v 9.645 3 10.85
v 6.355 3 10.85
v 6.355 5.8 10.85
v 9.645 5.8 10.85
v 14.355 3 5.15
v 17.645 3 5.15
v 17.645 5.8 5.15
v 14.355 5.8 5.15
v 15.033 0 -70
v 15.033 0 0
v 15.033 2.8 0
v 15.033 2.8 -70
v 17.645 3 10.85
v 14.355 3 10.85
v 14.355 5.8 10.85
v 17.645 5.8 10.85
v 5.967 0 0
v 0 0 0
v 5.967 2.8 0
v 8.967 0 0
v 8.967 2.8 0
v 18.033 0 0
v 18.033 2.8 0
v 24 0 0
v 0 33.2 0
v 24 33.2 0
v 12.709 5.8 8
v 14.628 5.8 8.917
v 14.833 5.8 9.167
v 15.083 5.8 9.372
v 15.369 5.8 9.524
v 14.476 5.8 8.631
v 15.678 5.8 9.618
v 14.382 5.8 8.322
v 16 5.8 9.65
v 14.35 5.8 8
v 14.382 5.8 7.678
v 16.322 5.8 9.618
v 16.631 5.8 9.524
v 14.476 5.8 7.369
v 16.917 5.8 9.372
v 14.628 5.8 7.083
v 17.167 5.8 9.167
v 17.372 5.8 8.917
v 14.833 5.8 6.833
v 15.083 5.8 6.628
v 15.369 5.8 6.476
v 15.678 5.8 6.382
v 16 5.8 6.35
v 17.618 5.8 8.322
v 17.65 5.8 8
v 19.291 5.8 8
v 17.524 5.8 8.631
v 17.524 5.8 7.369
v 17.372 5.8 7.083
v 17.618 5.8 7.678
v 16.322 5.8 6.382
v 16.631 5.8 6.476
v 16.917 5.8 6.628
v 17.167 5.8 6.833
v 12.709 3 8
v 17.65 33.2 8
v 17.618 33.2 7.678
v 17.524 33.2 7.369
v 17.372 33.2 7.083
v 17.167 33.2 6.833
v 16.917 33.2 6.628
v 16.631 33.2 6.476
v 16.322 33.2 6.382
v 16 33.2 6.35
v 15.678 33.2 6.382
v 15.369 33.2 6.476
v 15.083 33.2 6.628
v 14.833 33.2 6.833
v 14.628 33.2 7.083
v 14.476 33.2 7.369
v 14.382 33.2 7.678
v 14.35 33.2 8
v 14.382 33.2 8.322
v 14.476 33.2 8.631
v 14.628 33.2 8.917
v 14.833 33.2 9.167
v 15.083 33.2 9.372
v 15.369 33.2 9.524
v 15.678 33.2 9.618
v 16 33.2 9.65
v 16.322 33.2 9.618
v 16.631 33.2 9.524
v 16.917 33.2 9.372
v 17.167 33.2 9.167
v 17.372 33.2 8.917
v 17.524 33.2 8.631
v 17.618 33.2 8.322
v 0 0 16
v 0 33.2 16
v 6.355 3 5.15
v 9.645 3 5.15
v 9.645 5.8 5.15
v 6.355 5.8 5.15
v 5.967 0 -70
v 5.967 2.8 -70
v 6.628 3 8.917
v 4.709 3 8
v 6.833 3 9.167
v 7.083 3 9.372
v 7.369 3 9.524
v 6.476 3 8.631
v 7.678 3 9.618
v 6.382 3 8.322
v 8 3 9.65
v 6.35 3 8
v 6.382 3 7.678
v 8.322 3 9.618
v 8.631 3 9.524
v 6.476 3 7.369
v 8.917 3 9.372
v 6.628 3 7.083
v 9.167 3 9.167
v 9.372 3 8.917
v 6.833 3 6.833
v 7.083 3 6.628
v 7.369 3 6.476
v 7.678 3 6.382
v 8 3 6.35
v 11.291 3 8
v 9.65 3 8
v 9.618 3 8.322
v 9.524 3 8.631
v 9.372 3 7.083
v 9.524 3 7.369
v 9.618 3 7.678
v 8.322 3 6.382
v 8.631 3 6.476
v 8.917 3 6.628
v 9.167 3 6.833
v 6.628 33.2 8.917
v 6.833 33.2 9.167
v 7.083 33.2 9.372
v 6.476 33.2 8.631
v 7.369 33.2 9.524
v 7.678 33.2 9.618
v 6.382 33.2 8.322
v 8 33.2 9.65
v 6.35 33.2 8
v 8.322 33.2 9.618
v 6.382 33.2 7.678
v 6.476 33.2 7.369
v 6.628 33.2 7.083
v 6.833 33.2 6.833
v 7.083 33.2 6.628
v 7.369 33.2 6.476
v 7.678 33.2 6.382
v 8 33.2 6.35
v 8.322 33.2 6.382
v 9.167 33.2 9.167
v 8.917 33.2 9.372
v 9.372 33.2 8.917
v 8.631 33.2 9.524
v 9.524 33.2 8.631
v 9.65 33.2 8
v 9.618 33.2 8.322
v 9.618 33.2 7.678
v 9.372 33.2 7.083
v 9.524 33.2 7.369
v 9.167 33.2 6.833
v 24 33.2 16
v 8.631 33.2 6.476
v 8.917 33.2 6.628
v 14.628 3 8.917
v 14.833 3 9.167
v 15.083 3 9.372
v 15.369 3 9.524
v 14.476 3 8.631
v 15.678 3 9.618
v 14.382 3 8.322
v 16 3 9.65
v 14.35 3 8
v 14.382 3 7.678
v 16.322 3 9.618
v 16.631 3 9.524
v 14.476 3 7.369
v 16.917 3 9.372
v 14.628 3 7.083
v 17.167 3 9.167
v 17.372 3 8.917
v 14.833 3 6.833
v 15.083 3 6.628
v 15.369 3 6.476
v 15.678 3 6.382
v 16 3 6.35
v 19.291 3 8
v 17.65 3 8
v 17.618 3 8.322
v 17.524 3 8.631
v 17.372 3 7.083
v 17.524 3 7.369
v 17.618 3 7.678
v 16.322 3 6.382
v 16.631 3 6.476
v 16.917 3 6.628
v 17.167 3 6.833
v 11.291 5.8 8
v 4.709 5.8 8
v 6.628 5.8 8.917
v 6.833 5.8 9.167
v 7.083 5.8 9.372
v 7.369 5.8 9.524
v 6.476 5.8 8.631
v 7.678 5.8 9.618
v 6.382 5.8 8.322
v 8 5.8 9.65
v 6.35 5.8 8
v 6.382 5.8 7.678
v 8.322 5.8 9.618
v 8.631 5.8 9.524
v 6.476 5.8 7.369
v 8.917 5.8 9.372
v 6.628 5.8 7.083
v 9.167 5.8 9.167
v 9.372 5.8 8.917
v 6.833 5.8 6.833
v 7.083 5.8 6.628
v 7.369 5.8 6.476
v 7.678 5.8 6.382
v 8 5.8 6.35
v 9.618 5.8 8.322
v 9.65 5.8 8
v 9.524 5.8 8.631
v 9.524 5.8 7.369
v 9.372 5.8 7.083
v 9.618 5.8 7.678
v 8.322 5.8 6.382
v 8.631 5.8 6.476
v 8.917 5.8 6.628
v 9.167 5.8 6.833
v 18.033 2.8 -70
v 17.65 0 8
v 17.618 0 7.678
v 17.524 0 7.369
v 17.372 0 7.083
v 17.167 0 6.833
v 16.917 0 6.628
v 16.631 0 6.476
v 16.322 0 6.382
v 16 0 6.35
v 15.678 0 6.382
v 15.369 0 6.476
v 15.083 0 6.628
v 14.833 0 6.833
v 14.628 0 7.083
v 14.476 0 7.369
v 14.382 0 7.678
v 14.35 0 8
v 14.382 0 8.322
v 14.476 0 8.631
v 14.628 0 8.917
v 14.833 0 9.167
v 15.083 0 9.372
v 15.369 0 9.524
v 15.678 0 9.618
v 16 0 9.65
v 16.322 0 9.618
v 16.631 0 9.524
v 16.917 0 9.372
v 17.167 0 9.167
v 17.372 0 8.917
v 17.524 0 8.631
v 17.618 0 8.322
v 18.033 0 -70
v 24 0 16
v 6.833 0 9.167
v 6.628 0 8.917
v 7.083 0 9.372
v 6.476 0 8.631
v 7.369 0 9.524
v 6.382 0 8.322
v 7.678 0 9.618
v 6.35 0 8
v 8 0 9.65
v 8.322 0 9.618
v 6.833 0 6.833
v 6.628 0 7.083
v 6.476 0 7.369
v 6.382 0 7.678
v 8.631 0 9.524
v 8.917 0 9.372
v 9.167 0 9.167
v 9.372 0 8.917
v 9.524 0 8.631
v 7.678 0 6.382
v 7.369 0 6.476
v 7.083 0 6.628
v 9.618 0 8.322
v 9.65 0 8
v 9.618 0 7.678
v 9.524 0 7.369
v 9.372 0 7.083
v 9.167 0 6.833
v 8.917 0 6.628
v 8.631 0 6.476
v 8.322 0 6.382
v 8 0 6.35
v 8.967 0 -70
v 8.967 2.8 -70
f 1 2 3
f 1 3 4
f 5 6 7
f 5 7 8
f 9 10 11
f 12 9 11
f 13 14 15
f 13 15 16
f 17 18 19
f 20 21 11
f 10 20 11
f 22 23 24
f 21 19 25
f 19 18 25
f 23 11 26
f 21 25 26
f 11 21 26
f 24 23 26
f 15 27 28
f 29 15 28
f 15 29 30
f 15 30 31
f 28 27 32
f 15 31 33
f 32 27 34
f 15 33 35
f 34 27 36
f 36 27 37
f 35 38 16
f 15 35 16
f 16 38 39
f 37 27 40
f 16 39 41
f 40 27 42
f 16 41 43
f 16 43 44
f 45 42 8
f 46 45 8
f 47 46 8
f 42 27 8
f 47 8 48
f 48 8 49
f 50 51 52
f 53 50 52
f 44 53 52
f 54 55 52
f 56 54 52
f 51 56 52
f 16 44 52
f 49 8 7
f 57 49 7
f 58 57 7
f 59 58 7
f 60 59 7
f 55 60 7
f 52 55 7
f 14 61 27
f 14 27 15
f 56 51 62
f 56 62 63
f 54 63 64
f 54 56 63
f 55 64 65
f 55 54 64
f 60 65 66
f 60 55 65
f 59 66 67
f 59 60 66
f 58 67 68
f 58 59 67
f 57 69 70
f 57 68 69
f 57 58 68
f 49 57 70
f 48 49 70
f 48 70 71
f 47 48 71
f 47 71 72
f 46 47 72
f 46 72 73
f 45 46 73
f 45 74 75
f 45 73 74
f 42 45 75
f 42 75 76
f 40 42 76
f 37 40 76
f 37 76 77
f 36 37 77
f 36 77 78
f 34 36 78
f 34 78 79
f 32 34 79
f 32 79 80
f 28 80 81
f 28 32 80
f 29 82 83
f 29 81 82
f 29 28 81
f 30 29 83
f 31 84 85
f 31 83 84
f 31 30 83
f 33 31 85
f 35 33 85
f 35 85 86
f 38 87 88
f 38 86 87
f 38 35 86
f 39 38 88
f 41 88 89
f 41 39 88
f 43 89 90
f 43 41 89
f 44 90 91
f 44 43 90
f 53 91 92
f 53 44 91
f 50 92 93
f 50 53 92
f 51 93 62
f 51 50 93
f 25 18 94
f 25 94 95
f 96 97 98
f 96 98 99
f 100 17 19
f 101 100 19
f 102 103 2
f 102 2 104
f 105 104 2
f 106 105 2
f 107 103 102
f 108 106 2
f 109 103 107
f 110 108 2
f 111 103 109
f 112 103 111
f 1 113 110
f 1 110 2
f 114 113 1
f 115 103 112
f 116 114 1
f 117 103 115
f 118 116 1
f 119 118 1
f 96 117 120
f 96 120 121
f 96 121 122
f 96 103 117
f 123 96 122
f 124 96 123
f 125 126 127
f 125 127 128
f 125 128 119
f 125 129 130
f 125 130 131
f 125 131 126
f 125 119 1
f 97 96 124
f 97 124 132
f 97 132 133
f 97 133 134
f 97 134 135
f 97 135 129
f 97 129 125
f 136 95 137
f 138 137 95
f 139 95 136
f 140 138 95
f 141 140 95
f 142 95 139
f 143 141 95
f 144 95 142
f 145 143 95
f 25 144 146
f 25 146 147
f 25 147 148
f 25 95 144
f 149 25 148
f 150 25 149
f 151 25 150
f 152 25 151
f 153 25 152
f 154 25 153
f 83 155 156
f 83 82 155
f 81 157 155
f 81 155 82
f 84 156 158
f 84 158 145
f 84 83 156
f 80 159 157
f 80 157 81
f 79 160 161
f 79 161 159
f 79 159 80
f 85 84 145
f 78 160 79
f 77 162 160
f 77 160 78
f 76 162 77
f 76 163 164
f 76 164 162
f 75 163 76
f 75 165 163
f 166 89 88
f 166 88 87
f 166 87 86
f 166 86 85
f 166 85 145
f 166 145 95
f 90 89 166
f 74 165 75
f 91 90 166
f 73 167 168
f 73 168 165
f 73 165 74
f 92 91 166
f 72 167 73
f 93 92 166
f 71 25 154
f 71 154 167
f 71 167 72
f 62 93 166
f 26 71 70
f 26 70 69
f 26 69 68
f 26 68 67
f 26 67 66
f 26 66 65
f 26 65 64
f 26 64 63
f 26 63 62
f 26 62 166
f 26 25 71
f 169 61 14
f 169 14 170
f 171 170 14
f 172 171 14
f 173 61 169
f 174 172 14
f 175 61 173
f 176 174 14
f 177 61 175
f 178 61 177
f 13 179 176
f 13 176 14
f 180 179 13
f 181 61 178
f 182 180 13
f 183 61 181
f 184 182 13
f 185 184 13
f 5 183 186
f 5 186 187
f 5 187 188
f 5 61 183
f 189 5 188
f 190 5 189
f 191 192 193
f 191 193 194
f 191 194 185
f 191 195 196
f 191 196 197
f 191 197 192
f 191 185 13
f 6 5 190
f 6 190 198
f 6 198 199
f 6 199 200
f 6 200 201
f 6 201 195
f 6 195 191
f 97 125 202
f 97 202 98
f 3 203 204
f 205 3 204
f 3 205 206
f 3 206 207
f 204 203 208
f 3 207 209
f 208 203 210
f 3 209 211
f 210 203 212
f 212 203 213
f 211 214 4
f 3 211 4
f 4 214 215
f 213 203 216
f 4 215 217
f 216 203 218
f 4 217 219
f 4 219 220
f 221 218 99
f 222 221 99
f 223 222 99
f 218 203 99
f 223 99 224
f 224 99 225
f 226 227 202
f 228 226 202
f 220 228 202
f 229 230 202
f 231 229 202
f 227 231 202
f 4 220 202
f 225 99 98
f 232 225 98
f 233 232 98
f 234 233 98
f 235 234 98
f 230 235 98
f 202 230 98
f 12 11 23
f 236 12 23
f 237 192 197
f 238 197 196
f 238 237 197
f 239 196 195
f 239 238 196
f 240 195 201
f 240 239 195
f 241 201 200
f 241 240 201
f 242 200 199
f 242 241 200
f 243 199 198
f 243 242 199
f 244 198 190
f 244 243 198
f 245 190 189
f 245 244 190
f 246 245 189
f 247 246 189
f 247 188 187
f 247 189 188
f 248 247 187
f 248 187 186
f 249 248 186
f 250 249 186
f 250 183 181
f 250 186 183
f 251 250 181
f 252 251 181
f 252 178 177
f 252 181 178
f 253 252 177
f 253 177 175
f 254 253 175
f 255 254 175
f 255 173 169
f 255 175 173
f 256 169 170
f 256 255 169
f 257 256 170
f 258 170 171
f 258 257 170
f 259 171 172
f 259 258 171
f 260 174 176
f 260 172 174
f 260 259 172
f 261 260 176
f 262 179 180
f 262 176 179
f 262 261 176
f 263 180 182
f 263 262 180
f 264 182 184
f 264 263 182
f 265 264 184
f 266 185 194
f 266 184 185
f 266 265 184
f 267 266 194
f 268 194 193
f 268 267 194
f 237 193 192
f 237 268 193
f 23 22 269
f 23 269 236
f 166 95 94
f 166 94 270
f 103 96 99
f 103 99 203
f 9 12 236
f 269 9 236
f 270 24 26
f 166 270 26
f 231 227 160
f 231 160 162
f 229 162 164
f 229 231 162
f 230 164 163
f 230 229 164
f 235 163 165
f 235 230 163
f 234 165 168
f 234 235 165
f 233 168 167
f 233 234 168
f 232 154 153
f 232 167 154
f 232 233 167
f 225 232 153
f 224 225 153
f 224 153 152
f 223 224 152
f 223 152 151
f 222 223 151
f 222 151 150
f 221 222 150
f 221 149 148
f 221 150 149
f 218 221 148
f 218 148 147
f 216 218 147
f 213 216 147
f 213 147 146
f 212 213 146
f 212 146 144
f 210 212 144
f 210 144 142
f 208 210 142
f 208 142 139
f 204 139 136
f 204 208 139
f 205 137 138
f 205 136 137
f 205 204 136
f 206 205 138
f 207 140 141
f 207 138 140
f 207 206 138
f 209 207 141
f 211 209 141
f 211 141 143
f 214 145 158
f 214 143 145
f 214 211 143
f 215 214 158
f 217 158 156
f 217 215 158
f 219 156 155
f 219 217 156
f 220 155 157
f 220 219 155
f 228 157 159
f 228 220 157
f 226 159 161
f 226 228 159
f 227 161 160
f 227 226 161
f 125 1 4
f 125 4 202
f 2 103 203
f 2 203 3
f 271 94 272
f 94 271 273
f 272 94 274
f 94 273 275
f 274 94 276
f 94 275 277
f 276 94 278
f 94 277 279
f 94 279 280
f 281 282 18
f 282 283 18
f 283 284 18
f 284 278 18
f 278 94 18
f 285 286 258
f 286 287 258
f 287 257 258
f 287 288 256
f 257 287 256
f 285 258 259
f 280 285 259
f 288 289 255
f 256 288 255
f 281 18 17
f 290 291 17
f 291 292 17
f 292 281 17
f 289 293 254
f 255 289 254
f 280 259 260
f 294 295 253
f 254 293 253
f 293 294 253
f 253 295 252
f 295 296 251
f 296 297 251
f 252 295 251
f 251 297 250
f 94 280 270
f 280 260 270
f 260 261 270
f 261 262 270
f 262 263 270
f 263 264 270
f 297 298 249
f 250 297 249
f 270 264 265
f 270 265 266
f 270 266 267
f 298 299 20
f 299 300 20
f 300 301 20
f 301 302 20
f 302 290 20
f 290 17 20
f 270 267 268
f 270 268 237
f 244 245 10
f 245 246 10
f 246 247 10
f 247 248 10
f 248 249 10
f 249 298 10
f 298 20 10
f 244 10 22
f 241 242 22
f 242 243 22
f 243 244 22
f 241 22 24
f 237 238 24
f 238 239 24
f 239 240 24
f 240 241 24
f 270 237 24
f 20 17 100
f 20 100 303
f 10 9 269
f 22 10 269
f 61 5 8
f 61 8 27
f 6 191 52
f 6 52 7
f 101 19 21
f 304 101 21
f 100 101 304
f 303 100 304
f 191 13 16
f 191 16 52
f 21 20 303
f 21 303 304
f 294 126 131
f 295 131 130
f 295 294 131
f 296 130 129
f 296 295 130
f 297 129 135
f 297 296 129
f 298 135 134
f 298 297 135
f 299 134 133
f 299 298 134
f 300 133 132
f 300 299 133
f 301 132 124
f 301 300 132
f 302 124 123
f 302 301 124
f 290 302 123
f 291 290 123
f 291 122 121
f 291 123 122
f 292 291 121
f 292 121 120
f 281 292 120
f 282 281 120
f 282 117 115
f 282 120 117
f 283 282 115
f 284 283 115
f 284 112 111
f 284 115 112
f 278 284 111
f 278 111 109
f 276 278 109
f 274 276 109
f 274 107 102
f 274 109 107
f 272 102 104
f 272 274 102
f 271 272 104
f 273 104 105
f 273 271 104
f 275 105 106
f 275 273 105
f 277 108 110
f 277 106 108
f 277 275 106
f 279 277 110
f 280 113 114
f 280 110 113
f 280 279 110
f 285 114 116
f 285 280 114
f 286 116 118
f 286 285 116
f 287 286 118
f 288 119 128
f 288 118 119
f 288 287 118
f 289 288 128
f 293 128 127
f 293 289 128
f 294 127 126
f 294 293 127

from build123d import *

# Parameters (mm, degrees)
SKETCH2_W             = 3
SKETCH2_H             = 2.8
BOSS_EXTRUDE1_DEPTH   = 70
BOSS_EXTRUDE1_2_DEPTH = 70
SKETCH3_W             = 24
SKETCH3_H             = 33.2
BOSS_EXTRUDE2_DEPTH   = 16
SKETCH4_R             = 1.65
CUT_EXTRUDE1_DEPTH    = 34.2
CUT_EXTRUDE2_START    = 3
CUT_EXTRUDE2_DEPTH    = 2.8


with BuildPart() as part:
    # Sketch2 → Boss-Extrude1 (new body)
    with BuildSketch(Plane.XY):
        with Locations((7.466666667, 1.4)):
            Rectangle(SKETCH2_W, SKETCH2_H)
    extrude(amount=-BOSS_EXTRUDE1_DEPTH)



with BuildPart() as body_2:
    # Sketch2 → Boss-Extrude1 2 (new body)
    with BuildSketch(Plane.XY):
        with Locations((16.533333333, 1.4)):
            Rectangle(SKETCH2_W, SKETCH2_H)
    extrude(amount=-BOSS_EXTRUDE1_2_DEPTH)


with BuildPart() as part_1:
    add(part.part)

    add(body_2.part)  # Boss-Extrude2 merges body 2
    # Sketch3 → Boss-Extrude2 (add)
    with BuildSketch(Plane.XY):
        with Locations((12, 16.6)):
            Rectangle(SKETCH3_W, SKETCH3_H)
    extrude(amount=BOSS_EXTRUDE2_DEPTH)

    # Sketch4 → Cut-Extrude1 (cut, through all)
    with BuildSketch(Plane(origin=(0, 0, 0), x_dir=(1, 0, 0), z_dir=(0, 1, 0))):
        with Locations((8, -8)):
            Circle(SKETCH4_R)
        with Locations((16, -8)):
            Circle(SKETCH4_R)
    extrude(amount=CUT_EXTRUDE1_DEPTH, mode=Mode.SUBTRACT)

    # Sketch5 → Cut-Extrude2 (cut)
    with BuildSketch(Plane(origin=(0, 0, 0), x_dir=(1, 0, 0), z_dir=(0, 1, 0)).offset(CUT_EXTRUDE2_START)):
        Polygon((11.290896534, -8), (9.645448267, -5.15), (6.354551733, -5.15), (4.709103466, -8), (6.354551733, -10.85), (9.645448267, -10.85), align=None)
        Polygon((19.290896534, -8), (17.645448267, -5.15), (14.354551733, -5.15), (12.709103466, -8), (14.354551733, -10.85), (17.645448267, -10.85), align=None)
    extrude(amount=CUT_EXTRUDE2_DEPTH, mode=Mode.SUBTRACT)


solid = part_1.part
